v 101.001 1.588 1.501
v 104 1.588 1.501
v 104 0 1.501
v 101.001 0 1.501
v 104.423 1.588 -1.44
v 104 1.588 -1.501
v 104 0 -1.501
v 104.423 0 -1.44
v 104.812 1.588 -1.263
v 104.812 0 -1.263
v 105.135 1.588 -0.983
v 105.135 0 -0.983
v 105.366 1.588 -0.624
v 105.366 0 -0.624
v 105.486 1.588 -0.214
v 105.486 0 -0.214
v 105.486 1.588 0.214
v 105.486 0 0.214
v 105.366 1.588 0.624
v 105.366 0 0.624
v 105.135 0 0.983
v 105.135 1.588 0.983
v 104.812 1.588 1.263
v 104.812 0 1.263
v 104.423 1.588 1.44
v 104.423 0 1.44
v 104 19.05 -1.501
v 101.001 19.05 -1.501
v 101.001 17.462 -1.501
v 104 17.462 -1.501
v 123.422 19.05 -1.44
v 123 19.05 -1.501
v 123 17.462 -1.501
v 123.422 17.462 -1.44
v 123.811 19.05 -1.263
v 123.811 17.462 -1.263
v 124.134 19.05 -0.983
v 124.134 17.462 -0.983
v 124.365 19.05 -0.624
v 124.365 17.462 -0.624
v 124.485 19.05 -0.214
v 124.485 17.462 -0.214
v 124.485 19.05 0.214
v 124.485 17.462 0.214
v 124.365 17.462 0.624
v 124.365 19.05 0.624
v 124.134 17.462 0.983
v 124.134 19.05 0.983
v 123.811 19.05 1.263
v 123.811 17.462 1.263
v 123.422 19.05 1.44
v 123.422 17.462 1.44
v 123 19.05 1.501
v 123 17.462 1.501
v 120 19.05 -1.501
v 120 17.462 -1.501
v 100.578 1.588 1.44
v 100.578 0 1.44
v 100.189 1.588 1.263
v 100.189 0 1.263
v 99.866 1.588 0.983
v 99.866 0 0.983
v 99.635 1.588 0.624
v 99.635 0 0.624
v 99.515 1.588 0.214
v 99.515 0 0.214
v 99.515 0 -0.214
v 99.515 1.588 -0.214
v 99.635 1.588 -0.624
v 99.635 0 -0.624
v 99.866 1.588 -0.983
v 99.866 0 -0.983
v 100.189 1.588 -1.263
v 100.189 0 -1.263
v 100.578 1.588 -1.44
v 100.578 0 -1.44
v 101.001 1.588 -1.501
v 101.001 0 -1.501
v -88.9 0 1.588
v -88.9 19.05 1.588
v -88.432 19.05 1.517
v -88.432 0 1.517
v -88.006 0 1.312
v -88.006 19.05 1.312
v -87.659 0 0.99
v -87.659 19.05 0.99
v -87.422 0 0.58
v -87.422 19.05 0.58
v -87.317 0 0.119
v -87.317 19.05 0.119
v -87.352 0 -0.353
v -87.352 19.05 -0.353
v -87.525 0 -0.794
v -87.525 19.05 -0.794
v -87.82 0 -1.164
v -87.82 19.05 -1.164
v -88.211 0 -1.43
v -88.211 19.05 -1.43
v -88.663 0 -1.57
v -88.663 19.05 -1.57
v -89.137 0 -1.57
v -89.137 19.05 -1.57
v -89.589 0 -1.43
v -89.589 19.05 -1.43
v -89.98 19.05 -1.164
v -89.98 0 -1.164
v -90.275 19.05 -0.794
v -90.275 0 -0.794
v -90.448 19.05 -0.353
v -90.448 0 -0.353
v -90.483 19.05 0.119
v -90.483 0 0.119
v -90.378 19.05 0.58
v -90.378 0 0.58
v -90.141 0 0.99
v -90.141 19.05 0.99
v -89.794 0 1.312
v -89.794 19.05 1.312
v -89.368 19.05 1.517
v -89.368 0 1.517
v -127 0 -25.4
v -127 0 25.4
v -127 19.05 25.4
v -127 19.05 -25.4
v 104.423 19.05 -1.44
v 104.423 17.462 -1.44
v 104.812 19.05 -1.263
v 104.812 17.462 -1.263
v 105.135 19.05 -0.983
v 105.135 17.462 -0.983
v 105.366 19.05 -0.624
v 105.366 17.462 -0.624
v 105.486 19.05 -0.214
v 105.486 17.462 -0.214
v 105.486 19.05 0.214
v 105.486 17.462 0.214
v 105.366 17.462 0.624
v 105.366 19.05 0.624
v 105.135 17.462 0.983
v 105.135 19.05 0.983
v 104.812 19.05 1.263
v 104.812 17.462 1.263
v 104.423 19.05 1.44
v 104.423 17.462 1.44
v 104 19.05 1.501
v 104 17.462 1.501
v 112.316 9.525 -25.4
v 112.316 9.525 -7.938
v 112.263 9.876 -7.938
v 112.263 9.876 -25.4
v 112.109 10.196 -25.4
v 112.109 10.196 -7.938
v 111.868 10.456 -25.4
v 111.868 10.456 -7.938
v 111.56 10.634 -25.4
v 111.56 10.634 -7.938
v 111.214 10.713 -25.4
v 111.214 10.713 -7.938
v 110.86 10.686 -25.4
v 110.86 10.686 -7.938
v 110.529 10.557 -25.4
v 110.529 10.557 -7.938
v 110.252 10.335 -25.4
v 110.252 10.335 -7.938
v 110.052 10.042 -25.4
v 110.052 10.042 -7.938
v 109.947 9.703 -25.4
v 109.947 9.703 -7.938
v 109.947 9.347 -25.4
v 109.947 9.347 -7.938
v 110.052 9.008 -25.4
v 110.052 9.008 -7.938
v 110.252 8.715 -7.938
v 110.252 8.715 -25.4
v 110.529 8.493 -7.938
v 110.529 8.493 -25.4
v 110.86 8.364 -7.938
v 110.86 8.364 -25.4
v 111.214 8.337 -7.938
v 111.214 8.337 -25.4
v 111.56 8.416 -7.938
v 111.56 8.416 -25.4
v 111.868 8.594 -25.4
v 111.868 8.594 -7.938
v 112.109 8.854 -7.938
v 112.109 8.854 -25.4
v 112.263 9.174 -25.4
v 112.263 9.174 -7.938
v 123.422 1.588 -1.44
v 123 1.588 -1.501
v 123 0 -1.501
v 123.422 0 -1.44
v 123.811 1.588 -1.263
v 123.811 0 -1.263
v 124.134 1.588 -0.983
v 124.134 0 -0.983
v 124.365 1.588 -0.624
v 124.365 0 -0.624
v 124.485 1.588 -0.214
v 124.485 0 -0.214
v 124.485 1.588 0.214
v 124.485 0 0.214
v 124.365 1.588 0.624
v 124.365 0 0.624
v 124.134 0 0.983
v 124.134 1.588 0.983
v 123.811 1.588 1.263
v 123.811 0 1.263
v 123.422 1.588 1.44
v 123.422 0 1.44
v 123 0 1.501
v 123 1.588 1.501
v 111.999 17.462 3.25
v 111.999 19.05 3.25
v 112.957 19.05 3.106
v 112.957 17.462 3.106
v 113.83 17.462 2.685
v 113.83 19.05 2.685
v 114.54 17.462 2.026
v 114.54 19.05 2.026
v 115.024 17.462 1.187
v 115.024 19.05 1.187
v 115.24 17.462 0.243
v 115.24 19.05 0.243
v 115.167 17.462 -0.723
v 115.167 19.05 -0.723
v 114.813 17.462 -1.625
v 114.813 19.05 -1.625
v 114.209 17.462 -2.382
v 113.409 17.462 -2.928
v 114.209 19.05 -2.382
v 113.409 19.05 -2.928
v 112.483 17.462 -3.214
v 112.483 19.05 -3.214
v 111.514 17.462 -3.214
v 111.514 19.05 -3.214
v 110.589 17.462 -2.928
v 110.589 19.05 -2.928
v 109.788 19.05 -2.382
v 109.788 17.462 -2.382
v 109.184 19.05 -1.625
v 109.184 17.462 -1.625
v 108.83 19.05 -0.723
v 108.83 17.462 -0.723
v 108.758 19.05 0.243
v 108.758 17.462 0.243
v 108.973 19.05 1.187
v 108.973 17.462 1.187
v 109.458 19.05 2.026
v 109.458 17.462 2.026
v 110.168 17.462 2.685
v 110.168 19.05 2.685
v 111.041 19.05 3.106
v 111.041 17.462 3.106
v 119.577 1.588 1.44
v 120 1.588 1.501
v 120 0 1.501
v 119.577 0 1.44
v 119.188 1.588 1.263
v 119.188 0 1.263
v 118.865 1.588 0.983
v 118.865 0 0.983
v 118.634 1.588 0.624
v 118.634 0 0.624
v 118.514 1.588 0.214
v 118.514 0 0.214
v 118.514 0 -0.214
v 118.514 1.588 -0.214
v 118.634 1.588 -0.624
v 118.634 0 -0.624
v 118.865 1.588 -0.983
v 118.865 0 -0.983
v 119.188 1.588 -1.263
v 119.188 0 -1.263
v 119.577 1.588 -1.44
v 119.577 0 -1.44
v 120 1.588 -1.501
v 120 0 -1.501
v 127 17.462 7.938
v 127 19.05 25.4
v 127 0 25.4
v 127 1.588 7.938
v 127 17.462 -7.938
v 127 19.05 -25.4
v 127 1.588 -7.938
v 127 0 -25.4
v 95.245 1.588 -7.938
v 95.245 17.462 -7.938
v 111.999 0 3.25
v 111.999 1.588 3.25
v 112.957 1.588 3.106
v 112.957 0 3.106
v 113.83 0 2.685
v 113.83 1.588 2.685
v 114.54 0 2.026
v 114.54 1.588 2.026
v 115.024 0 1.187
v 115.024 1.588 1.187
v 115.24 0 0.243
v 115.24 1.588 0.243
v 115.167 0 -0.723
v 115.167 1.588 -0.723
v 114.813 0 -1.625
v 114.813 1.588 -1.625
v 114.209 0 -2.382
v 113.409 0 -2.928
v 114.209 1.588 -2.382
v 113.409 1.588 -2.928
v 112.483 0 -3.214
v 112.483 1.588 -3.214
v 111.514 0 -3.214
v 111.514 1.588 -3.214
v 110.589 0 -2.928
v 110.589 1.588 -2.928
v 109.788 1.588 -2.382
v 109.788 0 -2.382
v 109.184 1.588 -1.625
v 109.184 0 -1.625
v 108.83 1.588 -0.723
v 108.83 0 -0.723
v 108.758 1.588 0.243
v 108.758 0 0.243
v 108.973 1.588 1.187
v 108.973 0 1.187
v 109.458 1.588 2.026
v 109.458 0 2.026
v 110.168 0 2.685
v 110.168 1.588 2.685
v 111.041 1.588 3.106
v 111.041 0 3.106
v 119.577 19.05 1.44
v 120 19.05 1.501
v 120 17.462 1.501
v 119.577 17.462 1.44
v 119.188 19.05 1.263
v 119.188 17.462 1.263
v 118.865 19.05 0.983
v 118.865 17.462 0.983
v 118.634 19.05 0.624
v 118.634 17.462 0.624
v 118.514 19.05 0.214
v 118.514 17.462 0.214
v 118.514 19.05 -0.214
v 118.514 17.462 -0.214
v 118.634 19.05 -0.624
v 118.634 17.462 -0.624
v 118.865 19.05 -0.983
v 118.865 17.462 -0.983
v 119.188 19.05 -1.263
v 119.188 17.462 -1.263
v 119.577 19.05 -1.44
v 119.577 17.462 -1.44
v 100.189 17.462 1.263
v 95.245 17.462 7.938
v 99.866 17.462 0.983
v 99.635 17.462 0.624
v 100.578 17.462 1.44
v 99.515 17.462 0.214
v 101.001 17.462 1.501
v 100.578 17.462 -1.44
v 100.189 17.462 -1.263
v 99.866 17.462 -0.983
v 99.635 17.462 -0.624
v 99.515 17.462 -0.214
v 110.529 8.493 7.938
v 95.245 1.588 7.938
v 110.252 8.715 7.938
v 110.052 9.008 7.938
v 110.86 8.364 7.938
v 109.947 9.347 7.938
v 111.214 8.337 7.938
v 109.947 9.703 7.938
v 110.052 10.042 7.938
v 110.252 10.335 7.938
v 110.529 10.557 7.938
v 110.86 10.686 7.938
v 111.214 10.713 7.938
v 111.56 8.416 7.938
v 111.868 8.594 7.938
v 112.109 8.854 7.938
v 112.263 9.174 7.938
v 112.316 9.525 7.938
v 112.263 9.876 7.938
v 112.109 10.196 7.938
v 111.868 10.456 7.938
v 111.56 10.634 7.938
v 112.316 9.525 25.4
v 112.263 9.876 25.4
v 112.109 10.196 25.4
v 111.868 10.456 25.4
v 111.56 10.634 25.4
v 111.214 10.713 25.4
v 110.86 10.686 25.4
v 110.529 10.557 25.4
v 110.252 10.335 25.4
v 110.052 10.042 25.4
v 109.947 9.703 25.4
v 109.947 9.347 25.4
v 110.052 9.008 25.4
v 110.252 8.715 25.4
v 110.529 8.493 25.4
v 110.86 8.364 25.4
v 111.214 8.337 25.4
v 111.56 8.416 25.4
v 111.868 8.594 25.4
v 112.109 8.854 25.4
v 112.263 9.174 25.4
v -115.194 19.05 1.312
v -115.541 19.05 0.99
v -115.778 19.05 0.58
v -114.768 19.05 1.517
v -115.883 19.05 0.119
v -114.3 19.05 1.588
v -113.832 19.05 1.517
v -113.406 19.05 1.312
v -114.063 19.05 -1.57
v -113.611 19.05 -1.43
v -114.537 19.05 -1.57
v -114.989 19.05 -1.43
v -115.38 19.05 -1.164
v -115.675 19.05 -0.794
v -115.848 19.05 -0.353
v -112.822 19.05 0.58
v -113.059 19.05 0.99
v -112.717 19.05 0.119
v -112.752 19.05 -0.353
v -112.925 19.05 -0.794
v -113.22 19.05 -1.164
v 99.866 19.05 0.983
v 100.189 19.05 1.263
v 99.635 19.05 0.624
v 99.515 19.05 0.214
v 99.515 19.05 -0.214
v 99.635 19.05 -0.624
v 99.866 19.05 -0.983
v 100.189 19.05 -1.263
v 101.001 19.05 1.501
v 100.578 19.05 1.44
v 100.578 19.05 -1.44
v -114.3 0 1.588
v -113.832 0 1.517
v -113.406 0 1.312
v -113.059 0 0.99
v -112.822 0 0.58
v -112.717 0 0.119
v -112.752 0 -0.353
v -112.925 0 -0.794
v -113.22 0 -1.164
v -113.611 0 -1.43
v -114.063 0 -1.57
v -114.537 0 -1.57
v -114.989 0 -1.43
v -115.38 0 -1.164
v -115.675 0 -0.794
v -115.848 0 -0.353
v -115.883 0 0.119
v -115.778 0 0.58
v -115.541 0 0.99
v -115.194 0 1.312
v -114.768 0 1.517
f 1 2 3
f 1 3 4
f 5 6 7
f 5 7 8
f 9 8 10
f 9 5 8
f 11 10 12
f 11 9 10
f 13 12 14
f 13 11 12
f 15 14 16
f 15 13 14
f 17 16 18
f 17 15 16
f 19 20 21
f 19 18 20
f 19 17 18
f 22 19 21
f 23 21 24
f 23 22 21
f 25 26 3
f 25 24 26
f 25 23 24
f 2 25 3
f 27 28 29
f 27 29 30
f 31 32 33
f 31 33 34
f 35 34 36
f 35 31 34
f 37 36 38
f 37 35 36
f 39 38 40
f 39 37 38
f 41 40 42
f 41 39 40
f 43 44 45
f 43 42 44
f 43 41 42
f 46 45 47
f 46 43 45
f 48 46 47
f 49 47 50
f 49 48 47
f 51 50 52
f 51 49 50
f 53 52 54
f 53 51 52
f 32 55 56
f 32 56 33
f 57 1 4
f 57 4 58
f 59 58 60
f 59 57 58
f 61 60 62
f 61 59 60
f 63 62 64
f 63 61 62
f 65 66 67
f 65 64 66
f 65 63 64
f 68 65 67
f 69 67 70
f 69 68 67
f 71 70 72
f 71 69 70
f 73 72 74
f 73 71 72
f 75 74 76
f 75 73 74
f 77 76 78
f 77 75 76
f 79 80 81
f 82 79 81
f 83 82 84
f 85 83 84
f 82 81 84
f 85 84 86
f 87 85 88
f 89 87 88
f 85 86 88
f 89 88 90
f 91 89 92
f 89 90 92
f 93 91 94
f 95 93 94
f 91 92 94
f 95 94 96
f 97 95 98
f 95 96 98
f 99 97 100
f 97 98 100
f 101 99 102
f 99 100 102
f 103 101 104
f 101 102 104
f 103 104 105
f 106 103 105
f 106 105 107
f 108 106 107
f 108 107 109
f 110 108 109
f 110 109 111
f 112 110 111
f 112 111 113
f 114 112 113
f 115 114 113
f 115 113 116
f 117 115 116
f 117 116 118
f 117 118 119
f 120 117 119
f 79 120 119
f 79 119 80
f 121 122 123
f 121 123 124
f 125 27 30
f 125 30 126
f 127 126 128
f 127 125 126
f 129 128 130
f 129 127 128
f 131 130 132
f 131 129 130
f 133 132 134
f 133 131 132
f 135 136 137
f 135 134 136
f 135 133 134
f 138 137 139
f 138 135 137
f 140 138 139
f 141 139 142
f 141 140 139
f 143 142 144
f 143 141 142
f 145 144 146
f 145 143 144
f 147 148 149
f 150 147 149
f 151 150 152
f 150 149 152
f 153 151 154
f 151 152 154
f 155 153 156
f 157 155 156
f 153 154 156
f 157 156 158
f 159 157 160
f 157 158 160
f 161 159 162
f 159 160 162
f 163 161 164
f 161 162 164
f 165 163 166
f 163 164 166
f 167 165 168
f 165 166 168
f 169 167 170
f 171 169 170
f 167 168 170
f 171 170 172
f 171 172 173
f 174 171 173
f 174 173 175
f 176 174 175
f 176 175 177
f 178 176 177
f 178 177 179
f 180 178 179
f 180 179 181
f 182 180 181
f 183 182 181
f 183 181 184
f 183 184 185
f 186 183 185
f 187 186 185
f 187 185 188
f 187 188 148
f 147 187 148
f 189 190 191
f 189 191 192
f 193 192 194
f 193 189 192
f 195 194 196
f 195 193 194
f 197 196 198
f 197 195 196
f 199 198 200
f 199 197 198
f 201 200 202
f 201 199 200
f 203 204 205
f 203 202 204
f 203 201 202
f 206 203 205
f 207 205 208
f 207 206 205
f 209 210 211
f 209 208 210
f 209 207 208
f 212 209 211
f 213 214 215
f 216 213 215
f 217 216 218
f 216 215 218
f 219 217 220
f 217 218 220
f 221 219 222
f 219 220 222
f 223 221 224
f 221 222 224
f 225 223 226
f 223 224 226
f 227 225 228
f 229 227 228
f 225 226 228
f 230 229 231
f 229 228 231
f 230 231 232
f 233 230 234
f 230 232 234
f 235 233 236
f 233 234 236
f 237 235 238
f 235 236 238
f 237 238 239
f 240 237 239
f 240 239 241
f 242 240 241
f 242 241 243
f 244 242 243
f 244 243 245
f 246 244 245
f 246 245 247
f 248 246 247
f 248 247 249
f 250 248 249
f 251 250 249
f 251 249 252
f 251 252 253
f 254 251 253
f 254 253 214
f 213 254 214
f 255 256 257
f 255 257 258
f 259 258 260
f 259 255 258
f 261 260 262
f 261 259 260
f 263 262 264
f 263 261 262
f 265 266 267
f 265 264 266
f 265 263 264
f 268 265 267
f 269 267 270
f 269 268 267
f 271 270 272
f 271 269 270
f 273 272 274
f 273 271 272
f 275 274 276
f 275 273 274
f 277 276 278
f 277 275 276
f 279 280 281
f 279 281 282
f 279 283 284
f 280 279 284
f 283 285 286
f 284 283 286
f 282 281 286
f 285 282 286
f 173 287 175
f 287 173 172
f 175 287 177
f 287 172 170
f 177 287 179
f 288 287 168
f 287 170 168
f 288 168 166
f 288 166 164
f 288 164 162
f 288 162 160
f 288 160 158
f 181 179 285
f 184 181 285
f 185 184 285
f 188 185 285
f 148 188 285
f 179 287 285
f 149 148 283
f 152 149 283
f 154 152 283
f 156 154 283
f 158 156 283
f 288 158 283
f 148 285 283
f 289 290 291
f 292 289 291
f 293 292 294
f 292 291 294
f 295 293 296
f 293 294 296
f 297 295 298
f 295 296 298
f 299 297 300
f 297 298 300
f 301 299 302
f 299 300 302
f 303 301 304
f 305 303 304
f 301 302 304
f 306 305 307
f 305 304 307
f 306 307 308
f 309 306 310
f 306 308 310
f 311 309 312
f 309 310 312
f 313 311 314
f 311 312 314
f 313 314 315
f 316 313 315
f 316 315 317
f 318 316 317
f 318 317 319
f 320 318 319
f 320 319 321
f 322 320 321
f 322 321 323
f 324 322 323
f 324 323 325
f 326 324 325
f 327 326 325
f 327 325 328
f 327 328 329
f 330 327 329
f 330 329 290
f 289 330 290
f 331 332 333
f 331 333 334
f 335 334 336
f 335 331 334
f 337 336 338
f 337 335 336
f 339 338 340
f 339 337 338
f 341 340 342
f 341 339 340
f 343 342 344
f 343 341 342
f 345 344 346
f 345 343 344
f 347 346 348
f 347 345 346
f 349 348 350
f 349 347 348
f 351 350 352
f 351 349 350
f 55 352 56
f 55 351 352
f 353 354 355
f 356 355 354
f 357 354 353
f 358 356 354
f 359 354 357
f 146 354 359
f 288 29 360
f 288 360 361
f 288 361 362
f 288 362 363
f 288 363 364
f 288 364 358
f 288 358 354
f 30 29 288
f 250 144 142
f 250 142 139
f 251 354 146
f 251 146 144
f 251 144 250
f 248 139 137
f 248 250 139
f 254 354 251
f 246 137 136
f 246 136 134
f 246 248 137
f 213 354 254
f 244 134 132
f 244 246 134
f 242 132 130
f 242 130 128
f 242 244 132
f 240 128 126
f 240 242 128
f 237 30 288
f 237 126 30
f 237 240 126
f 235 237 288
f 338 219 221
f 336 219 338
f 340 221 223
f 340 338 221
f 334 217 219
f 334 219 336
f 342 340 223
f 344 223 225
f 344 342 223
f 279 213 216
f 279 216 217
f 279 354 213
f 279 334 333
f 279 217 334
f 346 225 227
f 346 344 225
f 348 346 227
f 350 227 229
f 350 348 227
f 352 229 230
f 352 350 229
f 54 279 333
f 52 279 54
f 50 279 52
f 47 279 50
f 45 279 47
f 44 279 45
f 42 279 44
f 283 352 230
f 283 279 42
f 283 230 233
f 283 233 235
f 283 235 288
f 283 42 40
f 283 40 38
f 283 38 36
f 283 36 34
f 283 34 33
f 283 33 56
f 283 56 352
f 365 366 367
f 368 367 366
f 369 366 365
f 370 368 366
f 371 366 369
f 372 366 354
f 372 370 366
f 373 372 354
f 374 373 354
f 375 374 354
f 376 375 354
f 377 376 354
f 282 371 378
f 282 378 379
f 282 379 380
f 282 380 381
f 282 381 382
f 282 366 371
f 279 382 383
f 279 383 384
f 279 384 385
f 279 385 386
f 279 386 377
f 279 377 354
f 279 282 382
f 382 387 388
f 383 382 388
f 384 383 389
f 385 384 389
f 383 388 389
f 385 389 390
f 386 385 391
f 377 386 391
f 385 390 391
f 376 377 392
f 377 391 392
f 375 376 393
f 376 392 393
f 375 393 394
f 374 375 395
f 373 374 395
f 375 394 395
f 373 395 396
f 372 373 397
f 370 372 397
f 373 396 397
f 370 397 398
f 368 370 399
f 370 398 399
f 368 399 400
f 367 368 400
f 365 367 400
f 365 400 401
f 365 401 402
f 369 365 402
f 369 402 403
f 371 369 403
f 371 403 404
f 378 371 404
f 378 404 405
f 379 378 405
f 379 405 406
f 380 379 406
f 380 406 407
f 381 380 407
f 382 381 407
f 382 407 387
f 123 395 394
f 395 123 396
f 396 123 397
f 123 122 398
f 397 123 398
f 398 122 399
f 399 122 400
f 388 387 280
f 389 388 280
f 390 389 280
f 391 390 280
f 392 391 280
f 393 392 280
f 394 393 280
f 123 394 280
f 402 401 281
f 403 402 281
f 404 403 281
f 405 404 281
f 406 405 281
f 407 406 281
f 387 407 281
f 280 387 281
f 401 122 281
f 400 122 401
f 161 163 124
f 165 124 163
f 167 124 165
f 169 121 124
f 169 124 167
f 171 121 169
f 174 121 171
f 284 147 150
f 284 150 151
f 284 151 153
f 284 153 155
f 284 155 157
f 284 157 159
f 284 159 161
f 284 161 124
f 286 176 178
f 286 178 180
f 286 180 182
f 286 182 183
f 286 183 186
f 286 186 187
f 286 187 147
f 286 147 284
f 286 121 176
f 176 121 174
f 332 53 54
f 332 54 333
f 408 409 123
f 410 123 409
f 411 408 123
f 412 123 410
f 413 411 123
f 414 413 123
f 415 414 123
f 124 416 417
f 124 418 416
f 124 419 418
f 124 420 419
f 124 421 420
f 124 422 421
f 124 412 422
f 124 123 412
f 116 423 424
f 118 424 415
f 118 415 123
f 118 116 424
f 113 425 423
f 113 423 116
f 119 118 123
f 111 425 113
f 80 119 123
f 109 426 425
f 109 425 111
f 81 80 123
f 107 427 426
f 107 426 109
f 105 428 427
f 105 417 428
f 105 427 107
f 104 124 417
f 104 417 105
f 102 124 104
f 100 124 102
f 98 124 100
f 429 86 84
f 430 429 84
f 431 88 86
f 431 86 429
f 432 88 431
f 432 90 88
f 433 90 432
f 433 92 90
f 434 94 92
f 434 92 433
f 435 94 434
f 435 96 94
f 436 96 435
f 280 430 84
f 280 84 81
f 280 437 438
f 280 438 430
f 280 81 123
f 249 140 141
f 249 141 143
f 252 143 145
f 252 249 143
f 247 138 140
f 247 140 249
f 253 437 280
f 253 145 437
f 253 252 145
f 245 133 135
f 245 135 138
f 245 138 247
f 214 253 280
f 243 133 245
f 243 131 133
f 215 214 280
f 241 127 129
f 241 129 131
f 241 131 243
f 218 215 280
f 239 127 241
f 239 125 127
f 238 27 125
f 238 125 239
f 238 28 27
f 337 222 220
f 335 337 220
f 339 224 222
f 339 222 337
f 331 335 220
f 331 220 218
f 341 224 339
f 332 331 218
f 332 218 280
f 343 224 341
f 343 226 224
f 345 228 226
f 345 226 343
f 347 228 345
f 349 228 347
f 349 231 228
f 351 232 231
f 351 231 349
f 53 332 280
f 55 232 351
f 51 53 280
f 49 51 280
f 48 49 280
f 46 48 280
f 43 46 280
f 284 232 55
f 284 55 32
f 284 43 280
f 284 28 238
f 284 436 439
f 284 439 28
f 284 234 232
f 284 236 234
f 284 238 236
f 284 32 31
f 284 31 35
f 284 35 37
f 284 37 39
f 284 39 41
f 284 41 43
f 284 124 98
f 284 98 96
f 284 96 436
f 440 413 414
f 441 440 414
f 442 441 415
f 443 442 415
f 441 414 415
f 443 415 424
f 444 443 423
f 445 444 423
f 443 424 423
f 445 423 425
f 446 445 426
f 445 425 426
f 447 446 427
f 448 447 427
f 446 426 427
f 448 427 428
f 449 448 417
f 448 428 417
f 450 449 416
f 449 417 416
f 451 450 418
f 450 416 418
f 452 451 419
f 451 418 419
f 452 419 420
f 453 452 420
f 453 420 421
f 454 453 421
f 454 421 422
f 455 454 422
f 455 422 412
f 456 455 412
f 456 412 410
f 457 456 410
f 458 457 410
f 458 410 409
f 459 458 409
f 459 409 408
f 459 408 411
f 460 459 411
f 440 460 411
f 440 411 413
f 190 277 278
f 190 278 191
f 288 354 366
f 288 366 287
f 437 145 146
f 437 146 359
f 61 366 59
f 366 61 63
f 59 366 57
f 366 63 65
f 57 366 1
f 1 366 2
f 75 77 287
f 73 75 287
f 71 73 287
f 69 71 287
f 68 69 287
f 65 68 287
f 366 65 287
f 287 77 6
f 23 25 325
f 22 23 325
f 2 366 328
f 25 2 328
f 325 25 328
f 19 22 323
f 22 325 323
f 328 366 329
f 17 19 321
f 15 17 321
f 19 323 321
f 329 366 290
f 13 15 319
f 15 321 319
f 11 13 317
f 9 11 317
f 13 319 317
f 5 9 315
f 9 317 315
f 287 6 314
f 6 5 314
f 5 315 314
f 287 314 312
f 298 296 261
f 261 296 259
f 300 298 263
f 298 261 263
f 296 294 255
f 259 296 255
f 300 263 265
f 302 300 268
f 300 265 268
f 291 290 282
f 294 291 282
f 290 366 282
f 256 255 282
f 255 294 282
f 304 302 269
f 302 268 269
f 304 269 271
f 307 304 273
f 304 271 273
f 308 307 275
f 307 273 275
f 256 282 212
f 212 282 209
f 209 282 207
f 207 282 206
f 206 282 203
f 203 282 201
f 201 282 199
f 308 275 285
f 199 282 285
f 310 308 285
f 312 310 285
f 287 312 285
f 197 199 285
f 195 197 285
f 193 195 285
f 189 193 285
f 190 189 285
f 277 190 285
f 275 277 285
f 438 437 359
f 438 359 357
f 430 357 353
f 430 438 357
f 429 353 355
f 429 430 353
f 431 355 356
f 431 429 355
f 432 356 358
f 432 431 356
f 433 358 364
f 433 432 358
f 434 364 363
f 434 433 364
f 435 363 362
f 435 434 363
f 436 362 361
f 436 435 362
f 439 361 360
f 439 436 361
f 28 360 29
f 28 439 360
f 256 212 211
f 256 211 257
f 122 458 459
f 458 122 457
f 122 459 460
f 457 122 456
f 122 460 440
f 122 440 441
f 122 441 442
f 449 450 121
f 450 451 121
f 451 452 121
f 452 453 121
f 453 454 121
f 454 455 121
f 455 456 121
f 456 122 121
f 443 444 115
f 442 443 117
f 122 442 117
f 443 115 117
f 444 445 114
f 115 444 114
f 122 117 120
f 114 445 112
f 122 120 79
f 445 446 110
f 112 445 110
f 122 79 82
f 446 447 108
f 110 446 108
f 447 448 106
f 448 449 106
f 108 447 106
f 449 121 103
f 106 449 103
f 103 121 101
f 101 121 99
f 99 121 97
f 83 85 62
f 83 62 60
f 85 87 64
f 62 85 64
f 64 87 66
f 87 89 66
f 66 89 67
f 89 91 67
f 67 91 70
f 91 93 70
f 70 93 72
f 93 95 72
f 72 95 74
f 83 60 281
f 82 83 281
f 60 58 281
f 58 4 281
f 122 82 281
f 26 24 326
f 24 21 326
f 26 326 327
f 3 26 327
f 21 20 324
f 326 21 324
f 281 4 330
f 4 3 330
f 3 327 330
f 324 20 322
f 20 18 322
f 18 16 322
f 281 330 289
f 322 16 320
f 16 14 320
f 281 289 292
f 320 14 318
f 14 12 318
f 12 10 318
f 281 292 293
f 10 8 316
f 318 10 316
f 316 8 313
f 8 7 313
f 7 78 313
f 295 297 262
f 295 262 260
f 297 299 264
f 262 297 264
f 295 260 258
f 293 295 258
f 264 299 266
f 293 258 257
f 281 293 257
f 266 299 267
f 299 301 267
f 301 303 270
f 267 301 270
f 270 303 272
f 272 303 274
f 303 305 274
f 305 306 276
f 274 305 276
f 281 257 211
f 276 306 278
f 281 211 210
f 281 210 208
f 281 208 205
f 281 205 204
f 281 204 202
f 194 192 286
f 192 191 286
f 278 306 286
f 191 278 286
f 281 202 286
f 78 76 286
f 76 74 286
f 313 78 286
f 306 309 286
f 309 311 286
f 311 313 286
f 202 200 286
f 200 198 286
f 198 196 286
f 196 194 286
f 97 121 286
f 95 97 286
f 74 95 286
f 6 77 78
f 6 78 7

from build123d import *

# Parameters (mm, degrees)
SKETCH1_W           = 254
SKETCH1_H           = 50.8
BOSS_EXTRUDE1_DEPTH = 19.05
SKETCH2_R           = 1.5875
SKETCH2_R_2         = 3.24993
CUT_EXTRUDE1_DEPTH  = 131.908603613
SKETCH3_R           = 1.19126
CUT_EXTRUDE2_DEPTH  = 139.103376135
SKETCH4_W           = 15.875
SKETCH4_H           = 15.875
CUT_EXTRUDE3_DEPTH  = 31.75508


with BuildPart() as part:
    # Sketch1 → Boss-Extrude1 (new body)
    with BuildSketch(Plane(origin=(0, 0, 0), x_dir=(1, 0, 0), z_dir=(0, 1, 0))):
        Rectangle(SKETCH1_W, SKETCH1_H)
    extrude(amount=BOSS_EXTRUDE1_DEPTH)

    # Sketch2 → Cut-Extrude1 (cut, through all)
    with BuildSketch(Plane(origin=(0, 19.05, 0), x_dir=(1, 0, 0), z_dir=(0, 1, 0))):
        with Locations(Location((-114.3, 0, 0), (0, 0, 270))):
            Circle(SKETCH2_R)
        with Locations(Location((-88.9, 0, 0), (0, 0, 270))):
            Circle(SKETCH2_R)
        with Locations(Location((111.99876, 0, 0), (0, 0, 270))):
            Circle(SKETCH2_R_2)
        with BuildLine():
            Line((122.9995, -1.50114), (119.99976, -1.50114))
            ThreePointArc((119.99976, -1.50114), (118.49862, 0), (119.99976, 1.50114))
            Line((119.99976, 1.50114), (122.9995, 1.50114))
            ThreePointArc((122.9995, 1.50114), (124.50064, 0), (122.9995, -1.50114))
        make_face()
        with BuildLine():
            Line((104.0003, -1.50114), (101.00056, -1.50114))
            ThreePointArc((101.00056, -1.50114), (99.49942, 0), (101.00056, 1.50114))
            Line((101.00056, 1.50114), (104.0003, 1.50114))
            ThreePointArc((104.0003, 1.50114), (105.50144, 0), (104.0003, -1.50114))
        make_face()
    extrude(amount=-CUT_EXTRUDE1_DEPTH, mode=Mode.SUBTRACT)

    # Sketch3 → Cut-Extrude2 (cut, through all)
    with BuildSketch(Plane.XY.offset(25.4)):
        with Locations((111.125, 9.525)):
            Circle(SKETCH3_R)
    extrude(amount=-CUT_EXTRUDE2_DEPTH, mode=Mode.SUBTRACT)

    # Sketch4 → Cut-Extrude3 (cut)
    with BuildSketch(Plane(origin=(127, 0, 0), x_dir=(0, 0, -1), z_dir=(1, 0, 0))):
        with Locations((0, 9.525)):
            Rectangle(SKETCH4_W, SKETCH4_H)
    extrude(amount=-CUT_EXTRUDE3_DEPTH, mode=Mode.SUBTRACT)


solid = part.part
